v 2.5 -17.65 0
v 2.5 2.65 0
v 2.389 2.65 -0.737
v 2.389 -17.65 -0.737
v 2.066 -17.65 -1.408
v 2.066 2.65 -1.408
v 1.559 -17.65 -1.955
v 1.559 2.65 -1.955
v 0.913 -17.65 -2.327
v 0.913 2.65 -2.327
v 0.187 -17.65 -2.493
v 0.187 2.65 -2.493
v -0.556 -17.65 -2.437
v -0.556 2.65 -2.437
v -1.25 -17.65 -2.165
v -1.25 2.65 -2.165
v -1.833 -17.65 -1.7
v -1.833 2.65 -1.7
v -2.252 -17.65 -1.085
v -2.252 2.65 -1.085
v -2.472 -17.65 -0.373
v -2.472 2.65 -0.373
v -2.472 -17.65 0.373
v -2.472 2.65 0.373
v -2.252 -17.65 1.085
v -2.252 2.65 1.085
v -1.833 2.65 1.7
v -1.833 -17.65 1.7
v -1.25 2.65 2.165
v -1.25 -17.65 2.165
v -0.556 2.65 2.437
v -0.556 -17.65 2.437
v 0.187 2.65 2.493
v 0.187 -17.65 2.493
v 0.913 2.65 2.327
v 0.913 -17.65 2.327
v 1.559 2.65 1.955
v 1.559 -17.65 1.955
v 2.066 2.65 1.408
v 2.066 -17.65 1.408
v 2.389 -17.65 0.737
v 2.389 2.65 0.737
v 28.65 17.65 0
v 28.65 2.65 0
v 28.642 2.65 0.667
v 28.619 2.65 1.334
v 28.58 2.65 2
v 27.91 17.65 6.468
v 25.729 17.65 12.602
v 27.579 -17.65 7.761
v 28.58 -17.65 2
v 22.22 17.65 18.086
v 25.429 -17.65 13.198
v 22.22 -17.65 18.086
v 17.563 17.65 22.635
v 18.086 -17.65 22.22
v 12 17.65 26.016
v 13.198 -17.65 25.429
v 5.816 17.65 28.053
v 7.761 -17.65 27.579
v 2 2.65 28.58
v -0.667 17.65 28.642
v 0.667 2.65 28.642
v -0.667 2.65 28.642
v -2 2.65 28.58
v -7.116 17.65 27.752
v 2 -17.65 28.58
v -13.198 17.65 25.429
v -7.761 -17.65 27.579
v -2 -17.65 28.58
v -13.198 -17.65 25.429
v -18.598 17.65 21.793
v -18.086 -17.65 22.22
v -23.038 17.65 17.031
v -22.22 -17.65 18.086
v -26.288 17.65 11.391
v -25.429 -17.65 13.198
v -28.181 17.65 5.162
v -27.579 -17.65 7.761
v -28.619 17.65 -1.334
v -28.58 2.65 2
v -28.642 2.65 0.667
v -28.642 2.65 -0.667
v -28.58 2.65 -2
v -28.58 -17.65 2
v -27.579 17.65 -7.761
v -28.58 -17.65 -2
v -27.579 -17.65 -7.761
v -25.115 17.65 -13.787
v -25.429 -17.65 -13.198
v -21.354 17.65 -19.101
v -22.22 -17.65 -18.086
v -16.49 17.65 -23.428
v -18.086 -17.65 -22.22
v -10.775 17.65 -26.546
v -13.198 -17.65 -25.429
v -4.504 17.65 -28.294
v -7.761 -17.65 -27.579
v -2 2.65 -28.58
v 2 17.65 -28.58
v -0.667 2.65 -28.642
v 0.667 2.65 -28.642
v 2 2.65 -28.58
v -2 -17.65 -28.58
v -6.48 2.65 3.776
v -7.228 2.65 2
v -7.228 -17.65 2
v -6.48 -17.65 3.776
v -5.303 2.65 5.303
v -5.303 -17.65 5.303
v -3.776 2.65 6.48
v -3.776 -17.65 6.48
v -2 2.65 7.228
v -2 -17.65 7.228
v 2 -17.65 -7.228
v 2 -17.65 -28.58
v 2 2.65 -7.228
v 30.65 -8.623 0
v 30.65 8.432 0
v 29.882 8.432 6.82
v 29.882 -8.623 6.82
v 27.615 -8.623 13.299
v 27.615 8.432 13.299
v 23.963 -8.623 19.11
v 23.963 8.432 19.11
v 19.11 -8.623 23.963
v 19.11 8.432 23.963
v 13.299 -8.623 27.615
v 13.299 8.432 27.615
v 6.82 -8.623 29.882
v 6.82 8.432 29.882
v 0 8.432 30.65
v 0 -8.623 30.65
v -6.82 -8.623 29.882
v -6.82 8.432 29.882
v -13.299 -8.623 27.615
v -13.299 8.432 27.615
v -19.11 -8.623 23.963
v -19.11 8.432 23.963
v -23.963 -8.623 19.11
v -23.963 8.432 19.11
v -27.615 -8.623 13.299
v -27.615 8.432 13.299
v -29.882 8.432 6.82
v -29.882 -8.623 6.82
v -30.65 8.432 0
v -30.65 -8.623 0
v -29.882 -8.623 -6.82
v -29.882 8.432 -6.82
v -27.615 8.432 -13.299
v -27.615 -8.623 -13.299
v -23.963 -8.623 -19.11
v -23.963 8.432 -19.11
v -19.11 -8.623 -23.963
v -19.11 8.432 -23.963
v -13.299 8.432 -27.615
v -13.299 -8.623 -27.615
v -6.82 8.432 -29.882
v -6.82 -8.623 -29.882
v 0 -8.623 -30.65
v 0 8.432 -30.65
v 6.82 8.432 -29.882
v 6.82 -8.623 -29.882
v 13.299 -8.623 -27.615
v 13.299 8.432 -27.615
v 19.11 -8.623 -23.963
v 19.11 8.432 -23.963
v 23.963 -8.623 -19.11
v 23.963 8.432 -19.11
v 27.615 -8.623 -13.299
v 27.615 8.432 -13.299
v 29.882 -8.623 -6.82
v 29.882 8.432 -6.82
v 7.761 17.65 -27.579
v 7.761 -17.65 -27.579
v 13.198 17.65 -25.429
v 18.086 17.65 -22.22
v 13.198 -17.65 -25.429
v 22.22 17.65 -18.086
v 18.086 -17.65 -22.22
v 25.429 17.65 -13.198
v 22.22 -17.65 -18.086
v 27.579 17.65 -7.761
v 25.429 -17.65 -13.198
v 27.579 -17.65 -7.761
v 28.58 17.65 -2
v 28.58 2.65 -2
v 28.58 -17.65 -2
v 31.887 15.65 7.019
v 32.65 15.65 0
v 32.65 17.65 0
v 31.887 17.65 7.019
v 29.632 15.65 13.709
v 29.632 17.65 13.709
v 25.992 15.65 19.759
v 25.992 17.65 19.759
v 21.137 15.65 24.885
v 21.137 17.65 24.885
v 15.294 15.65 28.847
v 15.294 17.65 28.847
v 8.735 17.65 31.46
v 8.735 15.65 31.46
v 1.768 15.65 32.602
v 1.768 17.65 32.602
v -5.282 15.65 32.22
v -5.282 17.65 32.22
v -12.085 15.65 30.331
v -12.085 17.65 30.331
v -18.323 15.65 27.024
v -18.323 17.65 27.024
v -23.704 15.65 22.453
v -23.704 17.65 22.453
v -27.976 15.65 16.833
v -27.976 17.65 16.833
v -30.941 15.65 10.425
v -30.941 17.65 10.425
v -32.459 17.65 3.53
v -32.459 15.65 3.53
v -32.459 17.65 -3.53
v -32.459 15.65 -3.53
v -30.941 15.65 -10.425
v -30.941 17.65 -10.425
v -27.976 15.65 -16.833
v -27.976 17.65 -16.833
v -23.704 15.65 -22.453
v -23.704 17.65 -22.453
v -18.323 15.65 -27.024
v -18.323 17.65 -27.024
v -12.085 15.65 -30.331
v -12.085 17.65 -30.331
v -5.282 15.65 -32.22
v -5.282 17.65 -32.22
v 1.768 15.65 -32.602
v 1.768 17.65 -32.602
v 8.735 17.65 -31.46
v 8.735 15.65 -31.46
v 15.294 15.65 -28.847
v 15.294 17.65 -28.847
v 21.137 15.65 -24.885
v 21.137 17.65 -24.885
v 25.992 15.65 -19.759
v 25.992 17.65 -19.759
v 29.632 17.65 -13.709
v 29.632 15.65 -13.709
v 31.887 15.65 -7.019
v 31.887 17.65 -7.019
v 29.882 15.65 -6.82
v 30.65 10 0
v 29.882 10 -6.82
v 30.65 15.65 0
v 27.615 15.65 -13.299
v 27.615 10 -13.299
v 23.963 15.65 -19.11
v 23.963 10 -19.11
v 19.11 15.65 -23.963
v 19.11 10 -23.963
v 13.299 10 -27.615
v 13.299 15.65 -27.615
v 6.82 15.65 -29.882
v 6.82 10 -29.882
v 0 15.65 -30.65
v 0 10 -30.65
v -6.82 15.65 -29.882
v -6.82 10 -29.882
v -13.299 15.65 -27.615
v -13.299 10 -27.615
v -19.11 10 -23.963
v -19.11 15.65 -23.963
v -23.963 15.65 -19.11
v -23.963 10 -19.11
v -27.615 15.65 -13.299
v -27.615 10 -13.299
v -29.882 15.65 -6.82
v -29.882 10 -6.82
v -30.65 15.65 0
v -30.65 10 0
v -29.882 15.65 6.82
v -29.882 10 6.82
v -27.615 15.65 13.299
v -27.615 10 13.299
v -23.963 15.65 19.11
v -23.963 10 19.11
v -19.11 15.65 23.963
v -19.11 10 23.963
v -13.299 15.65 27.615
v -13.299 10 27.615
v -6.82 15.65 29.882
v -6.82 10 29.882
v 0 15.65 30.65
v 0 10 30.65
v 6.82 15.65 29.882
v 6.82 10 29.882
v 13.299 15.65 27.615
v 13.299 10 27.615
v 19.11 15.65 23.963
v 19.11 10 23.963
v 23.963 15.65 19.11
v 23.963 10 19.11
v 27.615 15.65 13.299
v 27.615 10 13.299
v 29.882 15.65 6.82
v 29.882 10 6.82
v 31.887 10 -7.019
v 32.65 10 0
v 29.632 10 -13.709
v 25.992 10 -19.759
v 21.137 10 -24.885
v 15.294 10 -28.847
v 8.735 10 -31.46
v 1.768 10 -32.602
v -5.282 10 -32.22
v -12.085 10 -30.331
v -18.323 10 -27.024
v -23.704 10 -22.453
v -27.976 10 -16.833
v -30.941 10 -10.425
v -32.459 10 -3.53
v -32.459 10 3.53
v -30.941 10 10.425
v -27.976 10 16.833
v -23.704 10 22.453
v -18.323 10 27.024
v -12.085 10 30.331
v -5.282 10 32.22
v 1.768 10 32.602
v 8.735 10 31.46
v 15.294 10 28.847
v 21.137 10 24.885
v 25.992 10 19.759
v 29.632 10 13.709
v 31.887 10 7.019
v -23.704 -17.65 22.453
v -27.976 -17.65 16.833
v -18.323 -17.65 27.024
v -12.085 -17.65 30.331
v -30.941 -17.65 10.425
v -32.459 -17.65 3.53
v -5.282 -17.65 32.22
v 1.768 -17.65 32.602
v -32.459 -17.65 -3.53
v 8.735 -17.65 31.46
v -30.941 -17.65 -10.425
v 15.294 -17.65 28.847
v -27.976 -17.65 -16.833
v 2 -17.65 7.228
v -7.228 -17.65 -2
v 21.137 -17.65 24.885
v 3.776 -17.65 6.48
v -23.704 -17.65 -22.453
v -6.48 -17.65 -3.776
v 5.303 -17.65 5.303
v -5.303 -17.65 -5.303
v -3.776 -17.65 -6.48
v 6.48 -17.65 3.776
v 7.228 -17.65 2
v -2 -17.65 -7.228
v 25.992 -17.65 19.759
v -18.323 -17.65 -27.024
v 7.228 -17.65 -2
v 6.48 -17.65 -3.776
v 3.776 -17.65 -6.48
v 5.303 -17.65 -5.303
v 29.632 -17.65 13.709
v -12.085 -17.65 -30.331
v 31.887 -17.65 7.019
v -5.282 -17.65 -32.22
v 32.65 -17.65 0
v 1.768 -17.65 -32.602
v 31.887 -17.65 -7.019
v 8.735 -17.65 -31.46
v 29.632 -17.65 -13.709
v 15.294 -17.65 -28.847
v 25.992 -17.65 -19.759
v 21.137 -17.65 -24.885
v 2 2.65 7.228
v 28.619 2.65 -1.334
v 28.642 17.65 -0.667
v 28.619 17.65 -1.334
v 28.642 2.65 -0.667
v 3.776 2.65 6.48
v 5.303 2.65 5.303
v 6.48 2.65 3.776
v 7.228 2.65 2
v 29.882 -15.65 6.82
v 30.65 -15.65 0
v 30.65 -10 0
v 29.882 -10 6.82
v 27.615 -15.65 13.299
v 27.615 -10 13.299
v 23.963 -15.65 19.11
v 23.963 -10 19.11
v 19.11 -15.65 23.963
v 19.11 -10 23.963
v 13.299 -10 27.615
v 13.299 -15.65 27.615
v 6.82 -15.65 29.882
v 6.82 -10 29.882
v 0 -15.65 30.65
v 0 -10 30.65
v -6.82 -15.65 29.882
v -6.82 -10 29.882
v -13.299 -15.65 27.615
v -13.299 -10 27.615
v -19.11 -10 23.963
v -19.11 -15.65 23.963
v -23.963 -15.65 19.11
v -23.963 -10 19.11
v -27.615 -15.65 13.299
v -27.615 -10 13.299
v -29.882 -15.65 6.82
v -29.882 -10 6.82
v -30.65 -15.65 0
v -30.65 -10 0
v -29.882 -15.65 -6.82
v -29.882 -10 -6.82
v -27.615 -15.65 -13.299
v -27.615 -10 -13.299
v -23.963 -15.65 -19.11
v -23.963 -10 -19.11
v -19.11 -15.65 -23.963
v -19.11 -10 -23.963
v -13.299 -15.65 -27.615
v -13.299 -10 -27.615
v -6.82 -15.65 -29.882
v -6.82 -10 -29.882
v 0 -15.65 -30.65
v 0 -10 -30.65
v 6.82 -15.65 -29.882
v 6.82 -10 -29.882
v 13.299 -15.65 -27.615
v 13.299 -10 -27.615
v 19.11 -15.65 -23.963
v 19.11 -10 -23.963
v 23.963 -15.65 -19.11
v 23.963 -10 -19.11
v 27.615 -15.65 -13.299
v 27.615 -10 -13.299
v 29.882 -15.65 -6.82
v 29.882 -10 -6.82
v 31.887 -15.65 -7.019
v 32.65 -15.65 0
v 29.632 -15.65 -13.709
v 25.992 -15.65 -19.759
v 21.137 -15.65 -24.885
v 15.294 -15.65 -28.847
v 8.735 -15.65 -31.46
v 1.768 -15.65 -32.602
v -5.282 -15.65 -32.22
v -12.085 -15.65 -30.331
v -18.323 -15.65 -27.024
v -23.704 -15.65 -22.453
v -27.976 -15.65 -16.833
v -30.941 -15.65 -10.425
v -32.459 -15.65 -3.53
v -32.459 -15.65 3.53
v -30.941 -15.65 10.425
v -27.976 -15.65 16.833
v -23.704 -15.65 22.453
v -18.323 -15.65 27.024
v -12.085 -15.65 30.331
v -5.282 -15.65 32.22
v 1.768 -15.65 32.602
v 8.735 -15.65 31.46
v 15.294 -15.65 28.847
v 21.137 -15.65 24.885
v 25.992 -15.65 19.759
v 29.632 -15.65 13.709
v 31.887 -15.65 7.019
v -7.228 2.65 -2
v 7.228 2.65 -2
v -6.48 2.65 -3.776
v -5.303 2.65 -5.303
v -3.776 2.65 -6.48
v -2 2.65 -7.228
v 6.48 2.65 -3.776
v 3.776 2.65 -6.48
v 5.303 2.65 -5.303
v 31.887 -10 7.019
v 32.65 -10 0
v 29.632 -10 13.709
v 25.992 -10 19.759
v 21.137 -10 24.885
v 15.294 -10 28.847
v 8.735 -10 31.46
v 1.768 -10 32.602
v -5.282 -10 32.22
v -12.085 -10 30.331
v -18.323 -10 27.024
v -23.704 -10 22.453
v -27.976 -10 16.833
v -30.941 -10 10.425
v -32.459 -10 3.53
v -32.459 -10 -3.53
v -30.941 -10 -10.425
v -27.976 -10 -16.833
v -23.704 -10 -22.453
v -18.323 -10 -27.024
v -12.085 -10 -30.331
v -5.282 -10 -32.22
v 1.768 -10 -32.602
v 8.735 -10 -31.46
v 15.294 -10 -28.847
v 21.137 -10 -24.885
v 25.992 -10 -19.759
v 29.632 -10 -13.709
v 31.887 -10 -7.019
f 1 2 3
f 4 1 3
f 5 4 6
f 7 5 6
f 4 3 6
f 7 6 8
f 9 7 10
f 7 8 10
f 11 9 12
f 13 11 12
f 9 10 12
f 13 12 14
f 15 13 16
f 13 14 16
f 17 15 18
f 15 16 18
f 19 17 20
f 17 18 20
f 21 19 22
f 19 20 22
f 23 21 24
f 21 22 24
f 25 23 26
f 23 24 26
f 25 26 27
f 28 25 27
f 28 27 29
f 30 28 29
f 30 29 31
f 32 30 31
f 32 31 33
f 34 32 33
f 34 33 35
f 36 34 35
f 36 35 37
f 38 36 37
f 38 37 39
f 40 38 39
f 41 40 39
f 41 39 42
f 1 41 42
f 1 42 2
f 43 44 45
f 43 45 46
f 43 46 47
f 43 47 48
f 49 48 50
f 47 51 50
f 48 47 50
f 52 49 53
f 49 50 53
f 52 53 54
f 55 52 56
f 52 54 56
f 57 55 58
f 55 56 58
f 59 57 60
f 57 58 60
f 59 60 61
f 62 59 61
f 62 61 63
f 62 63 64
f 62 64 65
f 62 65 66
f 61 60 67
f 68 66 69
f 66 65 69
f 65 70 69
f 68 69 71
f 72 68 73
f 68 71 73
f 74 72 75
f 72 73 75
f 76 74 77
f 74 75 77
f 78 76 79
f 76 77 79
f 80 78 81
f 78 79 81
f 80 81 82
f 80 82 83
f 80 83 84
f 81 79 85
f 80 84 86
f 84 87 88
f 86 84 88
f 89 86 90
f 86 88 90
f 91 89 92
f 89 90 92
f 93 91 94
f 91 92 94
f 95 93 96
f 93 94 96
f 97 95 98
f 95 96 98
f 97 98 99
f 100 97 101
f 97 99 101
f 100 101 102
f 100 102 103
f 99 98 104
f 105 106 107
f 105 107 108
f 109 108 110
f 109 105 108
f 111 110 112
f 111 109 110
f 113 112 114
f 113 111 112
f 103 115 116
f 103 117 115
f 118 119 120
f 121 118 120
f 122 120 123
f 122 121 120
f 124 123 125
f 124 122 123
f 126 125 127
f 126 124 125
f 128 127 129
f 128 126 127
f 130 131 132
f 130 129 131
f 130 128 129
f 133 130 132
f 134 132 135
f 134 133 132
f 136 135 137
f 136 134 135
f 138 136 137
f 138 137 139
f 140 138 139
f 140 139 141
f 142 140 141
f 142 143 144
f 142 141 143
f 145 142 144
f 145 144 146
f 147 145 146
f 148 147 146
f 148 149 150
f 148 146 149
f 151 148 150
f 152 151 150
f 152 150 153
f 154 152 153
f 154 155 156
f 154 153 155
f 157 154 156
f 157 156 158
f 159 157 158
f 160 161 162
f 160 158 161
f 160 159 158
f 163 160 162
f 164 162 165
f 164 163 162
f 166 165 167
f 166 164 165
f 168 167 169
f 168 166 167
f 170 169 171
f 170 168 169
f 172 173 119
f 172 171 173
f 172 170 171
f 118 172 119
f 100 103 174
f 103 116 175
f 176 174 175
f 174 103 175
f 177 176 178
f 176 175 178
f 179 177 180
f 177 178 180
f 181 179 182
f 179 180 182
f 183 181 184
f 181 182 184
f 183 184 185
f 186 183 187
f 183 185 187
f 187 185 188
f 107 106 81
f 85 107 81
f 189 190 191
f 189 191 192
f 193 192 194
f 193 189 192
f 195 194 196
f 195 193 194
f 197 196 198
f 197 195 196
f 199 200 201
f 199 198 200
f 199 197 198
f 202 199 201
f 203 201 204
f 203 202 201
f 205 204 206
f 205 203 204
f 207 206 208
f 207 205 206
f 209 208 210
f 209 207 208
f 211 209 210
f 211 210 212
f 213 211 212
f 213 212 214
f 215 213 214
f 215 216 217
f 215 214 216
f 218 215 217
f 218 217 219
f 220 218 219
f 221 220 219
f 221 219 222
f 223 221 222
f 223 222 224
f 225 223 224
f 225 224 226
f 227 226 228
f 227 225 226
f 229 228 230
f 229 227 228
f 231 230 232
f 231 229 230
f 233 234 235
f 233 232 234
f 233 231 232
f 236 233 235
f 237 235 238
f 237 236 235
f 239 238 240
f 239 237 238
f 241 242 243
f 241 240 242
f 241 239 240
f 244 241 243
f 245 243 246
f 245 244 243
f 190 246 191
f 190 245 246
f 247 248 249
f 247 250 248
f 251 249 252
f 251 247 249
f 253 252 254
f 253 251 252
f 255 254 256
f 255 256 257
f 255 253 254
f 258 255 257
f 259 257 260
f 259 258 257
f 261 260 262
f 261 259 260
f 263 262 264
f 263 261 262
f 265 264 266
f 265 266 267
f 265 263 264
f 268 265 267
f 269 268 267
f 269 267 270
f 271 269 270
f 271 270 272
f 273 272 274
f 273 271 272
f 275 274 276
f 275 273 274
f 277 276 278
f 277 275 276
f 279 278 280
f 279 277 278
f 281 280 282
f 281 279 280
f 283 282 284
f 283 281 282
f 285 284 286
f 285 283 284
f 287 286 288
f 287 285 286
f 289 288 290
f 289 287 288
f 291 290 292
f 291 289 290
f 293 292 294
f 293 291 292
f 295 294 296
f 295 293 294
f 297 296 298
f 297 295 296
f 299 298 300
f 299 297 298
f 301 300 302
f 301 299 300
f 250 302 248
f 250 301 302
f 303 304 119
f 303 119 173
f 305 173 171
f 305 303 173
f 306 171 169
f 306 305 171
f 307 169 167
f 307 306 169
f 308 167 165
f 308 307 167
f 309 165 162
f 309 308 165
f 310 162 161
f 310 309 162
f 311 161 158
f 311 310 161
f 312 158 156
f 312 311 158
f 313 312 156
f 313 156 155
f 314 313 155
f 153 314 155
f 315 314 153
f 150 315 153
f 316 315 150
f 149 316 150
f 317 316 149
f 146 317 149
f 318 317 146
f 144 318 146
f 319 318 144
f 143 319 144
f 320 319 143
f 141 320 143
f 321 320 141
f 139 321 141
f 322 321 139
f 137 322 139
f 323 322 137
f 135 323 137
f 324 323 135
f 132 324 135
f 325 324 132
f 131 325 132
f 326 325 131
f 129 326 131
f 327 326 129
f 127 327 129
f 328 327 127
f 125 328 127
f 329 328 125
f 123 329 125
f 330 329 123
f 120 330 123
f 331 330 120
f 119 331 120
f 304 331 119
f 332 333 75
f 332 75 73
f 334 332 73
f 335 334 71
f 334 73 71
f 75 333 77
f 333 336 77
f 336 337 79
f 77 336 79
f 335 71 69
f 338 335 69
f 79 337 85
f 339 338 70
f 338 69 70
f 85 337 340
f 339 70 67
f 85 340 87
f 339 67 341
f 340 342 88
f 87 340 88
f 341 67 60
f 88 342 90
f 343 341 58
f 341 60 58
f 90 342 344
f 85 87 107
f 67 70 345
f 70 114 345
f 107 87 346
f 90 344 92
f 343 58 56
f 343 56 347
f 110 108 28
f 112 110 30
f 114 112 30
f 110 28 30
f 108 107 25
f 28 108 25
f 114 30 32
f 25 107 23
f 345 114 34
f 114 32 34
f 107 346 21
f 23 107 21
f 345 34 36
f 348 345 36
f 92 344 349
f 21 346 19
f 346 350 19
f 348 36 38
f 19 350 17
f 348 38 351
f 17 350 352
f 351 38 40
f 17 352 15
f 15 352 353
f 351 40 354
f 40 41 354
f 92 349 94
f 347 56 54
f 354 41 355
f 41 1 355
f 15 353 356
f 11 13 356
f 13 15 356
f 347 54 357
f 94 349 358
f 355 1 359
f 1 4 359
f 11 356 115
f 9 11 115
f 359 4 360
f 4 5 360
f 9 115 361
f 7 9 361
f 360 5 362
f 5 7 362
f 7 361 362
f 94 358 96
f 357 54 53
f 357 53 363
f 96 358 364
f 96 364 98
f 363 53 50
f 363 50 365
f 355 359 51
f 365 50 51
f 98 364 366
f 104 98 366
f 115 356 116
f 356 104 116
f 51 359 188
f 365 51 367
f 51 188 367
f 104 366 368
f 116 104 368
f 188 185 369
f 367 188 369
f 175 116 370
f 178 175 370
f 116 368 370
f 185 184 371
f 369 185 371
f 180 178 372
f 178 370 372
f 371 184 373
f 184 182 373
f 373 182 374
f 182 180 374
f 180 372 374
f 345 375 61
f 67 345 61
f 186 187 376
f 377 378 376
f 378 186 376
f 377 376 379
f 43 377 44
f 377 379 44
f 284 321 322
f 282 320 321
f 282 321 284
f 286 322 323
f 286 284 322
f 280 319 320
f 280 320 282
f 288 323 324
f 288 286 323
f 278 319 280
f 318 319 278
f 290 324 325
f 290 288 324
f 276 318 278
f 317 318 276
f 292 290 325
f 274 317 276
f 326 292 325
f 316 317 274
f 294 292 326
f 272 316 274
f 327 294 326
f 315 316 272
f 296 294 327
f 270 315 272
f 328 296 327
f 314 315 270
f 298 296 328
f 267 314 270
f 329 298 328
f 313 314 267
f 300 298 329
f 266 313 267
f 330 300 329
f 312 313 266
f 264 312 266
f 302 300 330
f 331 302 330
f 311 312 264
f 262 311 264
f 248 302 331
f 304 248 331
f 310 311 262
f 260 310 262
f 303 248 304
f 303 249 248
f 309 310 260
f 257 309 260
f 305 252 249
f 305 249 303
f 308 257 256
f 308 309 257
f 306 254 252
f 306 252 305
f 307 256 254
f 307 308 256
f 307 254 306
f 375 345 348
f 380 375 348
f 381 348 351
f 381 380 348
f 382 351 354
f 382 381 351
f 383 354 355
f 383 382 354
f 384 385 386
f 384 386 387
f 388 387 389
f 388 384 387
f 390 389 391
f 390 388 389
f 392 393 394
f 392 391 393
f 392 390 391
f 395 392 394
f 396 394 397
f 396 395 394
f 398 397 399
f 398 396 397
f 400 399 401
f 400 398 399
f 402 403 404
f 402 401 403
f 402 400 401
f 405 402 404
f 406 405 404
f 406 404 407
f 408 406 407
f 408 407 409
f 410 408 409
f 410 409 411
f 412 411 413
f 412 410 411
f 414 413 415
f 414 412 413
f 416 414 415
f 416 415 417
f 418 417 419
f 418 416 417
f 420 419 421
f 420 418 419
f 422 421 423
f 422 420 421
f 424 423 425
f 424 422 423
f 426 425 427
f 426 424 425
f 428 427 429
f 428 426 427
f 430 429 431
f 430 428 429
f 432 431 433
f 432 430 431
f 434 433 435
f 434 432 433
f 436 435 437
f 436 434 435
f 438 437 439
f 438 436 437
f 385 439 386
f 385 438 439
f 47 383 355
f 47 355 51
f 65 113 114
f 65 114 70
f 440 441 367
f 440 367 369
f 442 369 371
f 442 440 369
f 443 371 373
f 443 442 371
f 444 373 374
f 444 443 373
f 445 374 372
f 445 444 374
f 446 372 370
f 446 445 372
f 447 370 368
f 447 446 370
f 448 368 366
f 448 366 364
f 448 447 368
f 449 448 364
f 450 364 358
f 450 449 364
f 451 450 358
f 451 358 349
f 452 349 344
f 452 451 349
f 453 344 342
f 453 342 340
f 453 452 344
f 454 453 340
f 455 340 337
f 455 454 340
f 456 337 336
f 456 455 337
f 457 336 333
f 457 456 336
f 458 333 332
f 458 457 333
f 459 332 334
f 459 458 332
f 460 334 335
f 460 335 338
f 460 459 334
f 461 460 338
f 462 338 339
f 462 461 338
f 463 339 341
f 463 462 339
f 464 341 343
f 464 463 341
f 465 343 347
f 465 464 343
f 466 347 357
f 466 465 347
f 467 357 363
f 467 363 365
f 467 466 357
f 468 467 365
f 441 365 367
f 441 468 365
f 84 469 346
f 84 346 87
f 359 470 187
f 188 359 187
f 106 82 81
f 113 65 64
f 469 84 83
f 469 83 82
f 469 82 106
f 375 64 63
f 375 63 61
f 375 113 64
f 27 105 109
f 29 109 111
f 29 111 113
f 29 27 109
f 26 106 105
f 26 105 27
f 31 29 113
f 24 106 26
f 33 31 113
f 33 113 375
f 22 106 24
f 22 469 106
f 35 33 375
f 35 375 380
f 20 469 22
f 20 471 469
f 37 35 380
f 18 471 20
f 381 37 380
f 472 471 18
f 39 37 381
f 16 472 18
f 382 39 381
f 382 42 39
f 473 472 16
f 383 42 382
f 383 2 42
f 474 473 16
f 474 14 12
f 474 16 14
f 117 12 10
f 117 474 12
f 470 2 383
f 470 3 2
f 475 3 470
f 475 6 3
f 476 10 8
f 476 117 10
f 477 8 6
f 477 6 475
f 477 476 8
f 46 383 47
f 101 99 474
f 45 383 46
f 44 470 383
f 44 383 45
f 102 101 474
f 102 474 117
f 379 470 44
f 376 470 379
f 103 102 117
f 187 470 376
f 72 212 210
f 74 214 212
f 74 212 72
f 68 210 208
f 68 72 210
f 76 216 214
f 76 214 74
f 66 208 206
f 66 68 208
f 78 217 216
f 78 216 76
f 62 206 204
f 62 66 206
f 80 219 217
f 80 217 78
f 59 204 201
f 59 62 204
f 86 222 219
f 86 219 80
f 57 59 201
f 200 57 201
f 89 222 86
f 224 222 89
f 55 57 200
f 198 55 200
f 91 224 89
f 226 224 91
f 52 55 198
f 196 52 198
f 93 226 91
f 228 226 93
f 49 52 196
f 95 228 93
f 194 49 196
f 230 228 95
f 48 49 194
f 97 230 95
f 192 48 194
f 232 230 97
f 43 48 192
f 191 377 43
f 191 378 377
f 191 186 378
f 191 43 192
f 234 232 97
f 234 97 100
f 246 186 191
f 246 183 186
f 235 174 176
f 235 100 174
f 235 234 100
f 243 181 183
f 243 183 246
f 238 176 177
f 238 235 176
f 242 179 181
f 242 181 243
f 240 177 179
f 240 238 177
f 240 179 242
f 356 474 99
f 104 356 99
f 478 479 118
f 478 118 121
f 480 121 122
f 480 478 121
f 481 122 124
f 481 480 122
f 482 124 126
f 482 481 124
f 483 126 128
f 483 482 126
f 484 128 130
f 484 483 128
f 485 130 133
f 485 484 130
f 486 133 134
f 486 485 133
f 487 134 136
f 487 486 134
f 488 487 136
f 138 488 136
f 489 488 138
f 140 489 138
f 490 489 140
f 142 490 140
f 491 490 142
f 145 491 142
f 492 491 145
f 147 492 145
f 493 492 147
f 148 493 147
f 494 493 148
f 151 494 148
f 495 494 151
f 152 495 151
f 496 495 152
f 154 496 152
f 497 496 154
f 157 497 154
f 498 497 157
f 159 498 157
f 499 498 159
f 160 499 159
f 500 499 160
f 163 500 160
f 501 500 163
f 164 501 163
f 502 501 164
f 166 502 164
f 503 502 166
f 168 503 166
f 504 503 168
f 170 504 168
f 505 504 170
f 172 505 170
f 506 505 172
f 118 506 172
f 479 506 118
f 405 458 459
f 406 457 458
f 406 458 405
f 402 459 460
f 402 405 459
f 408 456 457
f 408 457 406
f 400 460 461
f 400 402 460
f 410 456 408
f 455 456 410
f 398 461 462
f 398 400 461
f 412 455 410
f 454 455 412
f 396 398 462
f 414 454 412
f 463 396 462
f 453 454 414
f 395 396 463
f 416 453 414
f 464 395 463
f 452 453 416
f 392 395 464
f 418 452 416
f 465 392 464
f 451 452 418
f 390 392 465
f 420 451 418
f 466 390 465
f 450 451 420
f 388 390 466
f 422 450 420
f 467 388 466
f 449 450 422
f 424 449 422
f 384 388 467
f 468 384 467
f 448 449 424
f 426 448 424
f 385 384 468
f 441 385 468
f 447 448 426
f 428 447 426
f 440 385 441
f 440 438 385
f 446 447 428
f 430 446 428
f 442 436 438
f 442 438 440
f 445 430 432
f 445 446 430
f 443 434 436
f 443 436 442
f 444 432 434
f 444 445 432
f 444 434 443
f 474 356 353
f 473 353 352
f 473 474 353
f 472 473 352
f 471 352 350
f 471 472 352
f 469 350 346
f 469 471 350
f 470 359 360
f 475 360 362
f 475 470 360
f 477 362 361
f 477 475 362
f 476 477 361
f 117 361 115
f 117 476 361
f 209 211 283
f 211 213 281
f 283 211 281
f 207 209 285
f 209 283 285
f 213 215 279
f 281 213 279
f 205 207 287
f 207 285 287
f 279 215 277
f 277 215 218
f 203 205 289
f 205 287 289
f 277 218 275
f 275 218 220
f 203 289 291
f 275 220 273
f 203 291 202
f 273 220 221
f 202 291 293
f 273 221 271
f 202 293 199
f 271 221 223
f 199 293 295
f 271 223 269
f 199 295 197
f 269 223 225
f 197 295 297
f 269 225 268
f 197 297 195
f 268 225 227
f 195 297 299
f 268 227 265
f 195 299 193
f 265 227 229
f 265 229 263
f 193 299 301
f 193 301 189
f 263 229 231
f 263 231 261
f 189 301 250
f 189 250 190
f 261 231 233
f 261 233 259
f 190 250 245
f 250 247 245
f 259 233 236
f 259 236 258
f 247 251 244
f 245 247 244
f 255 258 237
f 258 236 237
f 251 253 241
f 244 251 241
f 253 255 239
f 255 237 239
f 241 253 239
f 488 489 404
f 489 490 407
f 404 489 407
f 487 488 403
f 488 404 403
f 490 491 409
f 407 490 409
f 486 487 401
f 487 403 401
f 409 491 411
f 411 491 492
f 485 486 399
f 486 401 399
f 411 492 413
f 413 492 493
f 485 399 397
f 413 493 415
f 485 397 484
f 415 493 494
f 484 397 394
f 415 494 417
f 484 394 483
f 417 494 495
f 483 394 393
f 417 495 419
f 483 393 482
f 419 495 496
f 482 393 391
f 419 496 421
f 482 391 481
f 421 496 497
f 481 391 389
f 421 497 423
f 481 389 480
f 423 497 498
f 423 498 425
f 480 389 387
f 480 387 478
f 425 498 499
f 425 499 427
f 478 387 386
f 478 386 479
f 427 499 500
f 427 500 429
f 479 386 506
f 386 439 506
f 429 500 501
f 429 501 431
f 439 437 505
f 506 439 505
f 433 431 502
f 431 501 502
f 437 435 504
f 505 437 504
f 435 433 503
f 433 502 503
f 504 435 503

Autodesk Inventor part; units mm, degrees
ref_plane "YZ Plane" through (0, 0, 0) normal (1, 0, 0) x (0, 1, 0)
ref_plane "XZ Plane" through (0, 0, 0) normal (0, 1, 0) x (-1, 0, 0)
ref_plane "XY Plane" through (0, 0, 0) normal (0, 0, 1) x (1, 0, 0)
sketch "Sketch1" plane through (0, 0, 0) normal (0, 0, 1) x (1, 0, 0)
  line L0 (0, 0) -> (30.65, 0)
  line L1 (30.65, 0) -> (30.65, 17.65)
  line L2 (30.65, 0) -> (30.65, 10)
  line L3 (30.65, 17.65) -> (32.65, 17.65)
  line L4 (32.65, 17.65) -> (32.65, 15.65)
  line L5 (32.65, 15.65) -> (30.65, 15.65)
  line L6 (30.65, 10) -> (32.65, 10)
  line L7 (32.65, 10) -> (30.65, 8.4317)
  line L8 (30.65, 0) -> (30.65, -17.65)
  line L9 (30.65, -17.65) -> (32.65, -17.65)
  line L10 (32.65, -17.65) -> (32.65, -15.65)
  line L11 (32.65, -15.65) -> (30.65, -15.65)
  line L12 (30.65, -10) -> (32.65, -10)
  line L13 (30.65, 17.65) -> (28.65, 17.65)
  line L14 (28.65, 17.65) -> (28.65, -17.65)
  line L15 (28.65, -17.65) -> (30.65, -17.65)
  line L16 (32.65, -10) -> (30.65, -8.6227)
  line L17 (0, -24.71) -> (0, 24.71) projected
  dimension "d1" = 30.65
  dimension "d5" = 10
  dimension "d9" = 2
  dimension "d10" = 2
  dimension "d11" = 2
  dimension "d12" = 2
revolve "Revolution1" add sketch "Sketch1" angle 360 about axis through (0, -10, 0) along (0, 1, 0)
sketch "Sketch2" plane through (0, 17.65, 0) normal (0, 1, 0) x (1, 0, 0)
  circle A0 centre (0, 0) radius 28.65
  circle A1 centre (0, 0) radius 7.5
  circle A2 centre (0, 0) radius 28.65 projected
  line L0 (-7.2284, -2) -> (-28.5801, -2)
  line L1 (-38.7788, 0) -> (46.3448, 0) construction
  line L2 (-7.2284, 2) -> (-28.5801, 2)
  line L3 (-7.2284, -2) -> (-7.2284, 2) construction
  line L4 (-7.2284, 2) -> (-29.2518, 2) construction
  line L5 (-29.2518, 2) -> (-29.2518, -2) construction
  line L6 (-29.2518, -2) -> (-7.2284, -2) construction
  line L7 (-7.2284, -2) -> (-7.2284, 2)
  line L8 (-7.2284, 2) -> (-29.2518, 2)
  line L9 (-29.2518, 2) -> (-29.2518, -2)
  line L10 (-29.2518, -2) -> (-7.2284, -2)
  circle A3 centre (0, 0) radius 2.5
  dimension "d14" = 15
  dimension "d16" = 5
extrude "Extrusion1" add sketch "Sketch2" against normal up to surface (35.3 mm away) contours L2 A1 L0 A0 | A0 L10 L9 L8 | A1 L7 picked at (-14.5272, 0.2224) picked at (-5.6523, 0)
pattern_circular "Circular Pattern1" count 4 over 360 about axis through (0, 17.65, 0) along (0, -1, 0) of "Extrusion1"
sketch "Sketch3" plane through (0, 17.65, 0) normal (0, 1, 0) x (1, 0, 0)
  circle A0 centre (0, 0) radius 2.5 projected
  circle A1 centre (0, 0) radius 28.65
extrude "Extrusion2" cut sketch "Sketch3" against normal blind 15
properties part number "OSV Specific Wheel"
